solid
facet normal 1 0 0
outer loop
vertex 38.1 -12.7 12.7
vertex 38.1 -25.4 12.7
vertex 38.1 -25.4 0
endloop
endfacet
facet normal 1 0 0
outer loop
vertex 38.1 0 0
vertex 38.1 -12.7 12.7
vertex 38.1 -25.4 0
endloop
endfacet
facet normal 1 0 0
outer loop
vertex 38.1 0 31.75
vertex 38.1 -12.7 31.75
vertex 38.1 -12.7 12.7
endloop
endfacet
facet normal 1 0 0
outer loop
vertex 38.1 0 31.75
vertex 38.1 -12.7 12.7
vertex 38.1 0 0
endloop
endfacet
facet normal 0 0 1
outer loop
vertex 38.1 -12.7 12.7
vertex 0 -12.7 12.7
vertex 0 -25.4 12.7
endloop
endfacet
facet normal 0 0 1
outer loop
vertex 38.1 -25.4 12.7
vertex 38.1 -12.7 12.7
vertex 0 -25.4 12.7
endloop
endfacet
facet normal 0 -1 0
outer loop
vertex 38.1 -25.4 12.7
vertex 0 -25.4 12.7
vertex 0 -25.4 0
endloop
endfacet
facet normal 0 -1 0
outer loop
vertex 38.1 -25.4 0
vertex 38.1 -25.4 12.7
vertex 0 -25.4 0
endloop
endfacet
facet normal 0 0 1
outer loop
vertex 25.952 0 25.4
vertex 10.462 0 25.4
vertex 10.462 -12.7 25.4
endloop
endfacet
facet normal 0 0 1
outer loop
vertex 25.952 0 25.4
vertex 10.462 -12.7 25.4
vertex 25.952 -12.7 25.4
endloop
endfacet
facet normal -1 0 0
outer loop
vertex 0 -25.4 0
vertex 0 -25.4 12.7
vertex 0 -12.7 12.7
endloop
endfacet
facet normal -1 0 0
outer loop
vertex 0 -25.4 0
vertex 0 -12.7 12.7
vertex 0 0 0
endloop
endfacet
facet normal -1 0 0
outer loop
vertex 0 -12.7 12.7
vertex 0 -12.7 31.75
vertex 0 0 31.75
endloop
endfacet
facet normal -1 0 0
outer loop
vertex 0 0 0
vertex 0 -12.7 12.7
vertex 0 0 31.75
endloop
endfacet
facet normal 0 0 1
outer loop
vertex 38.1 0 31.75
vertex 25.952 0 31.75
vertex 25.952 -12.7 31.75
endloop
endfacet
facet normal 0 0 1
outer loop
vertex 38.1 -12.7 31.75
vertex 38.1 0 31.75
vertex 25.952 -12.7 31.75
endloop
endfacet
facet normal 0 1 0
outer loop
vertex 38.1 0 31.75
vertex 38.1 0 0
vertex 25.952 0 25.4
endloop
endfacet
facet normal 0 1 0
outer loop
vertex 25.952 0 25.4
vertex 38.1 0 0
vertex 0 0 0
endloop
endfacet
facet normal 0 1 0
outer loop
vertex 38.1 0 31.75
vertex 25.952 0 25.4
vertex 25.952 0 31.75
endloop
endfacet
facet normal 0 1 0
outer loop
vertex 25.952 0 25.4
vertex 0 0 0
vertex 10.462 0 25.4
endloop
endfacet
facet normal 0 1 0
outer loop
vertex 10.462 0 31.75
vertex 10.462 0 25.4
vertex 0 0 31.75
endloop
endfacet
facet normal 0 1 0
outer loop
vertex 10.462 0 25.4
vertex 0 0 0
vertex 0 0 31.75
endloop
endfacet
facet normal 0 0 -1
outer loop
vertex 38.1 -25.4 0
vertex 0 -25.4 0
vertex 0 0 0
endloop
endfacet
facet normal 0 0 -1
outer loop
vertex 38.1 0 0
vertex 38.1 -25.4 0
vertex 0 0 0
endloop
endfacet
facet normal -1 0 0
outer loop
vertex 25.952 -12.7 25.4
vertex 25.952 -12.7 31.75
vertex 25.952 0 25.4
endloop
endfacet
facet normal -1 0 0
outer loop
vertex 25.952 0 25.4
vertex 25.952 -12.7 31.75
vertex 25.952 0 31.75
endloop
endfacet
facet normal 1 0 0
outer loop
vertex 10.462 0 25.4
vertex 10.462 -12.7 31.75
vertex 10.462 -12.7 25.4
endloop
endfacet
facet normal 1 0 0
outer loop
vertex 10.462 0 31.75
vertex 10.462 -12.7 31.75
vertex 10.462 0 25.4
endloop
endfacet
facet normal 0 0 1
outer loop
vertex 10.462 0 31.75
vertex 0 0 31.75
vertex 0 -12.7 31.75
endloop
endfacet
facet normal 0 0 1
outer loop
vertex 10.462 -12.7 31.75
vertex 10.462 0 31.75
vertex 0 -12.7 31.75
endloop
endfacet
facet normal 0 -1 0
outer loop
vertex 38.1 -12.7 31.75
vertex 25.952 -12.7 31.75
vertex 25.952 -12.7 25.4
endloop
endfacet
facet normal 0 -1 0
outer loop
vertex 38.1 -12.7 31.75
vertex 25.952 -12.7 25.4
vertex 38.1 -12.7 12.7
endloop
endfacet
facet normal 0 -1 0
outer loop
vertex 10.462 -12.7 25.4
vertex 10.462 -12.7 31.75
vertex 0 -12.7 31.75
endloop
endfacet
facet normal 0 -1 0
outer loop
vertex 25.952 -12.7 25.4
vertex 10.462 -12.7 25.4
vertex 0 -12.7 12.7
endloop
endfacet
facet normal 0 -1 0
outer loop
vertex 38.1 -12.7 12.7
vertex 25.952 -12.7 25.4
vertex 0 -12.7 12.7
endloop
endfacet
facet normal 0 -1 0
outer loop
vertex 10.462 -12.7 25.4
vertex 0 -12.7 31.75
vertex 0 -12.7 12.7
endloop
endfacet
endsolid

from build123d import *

# Parameters (mm, degrees)
F1_DEPTH = 25.4
F2_DEPTH = 12.7
F3_W     = 15.489865
F3_H     = 12.7
F4_DEPTH = 6.35


with BuildPart() as f1:
    # F0 (on Right) → F1 (new body)
    with BuildSketch(Plane.YZ):
        Polygon((-25.4, 0), (0, 0), (0, 31.75), (-12.7, 31.75), (-12.7, 12.7), (-25.4, 12.7), align=None)
    extrude(amount=F1_DEPTH)

    # F1_face (on face) → F2 (join)
    with BuildSketch(Plane(origin=(25.4, -9.978571, 13.153571), x_dir=(0, 1, 0), z_dir=(1, 0, 0))):
        Polygon((-15.421429, -13.153571), (9.978571, -13.153571), (9.978571, 18.596429), (-2.721429, 18.596429), (-2.721429, -0.453571), (-15.421429, -0.453571), align=None)
    extrude(amount=F2_DEPTH)

    # F3 (on face) → F4 (cut)
    with BuildSketch(Plane.XY.offset(31.75)):
        with Locations((18.207432, -6.35)):
            Rectangle(F3_W, F3_H)
    extrude(amount=-F4_DEPTH, mode=Mode.SUBTRACT)


solid = f1.part
